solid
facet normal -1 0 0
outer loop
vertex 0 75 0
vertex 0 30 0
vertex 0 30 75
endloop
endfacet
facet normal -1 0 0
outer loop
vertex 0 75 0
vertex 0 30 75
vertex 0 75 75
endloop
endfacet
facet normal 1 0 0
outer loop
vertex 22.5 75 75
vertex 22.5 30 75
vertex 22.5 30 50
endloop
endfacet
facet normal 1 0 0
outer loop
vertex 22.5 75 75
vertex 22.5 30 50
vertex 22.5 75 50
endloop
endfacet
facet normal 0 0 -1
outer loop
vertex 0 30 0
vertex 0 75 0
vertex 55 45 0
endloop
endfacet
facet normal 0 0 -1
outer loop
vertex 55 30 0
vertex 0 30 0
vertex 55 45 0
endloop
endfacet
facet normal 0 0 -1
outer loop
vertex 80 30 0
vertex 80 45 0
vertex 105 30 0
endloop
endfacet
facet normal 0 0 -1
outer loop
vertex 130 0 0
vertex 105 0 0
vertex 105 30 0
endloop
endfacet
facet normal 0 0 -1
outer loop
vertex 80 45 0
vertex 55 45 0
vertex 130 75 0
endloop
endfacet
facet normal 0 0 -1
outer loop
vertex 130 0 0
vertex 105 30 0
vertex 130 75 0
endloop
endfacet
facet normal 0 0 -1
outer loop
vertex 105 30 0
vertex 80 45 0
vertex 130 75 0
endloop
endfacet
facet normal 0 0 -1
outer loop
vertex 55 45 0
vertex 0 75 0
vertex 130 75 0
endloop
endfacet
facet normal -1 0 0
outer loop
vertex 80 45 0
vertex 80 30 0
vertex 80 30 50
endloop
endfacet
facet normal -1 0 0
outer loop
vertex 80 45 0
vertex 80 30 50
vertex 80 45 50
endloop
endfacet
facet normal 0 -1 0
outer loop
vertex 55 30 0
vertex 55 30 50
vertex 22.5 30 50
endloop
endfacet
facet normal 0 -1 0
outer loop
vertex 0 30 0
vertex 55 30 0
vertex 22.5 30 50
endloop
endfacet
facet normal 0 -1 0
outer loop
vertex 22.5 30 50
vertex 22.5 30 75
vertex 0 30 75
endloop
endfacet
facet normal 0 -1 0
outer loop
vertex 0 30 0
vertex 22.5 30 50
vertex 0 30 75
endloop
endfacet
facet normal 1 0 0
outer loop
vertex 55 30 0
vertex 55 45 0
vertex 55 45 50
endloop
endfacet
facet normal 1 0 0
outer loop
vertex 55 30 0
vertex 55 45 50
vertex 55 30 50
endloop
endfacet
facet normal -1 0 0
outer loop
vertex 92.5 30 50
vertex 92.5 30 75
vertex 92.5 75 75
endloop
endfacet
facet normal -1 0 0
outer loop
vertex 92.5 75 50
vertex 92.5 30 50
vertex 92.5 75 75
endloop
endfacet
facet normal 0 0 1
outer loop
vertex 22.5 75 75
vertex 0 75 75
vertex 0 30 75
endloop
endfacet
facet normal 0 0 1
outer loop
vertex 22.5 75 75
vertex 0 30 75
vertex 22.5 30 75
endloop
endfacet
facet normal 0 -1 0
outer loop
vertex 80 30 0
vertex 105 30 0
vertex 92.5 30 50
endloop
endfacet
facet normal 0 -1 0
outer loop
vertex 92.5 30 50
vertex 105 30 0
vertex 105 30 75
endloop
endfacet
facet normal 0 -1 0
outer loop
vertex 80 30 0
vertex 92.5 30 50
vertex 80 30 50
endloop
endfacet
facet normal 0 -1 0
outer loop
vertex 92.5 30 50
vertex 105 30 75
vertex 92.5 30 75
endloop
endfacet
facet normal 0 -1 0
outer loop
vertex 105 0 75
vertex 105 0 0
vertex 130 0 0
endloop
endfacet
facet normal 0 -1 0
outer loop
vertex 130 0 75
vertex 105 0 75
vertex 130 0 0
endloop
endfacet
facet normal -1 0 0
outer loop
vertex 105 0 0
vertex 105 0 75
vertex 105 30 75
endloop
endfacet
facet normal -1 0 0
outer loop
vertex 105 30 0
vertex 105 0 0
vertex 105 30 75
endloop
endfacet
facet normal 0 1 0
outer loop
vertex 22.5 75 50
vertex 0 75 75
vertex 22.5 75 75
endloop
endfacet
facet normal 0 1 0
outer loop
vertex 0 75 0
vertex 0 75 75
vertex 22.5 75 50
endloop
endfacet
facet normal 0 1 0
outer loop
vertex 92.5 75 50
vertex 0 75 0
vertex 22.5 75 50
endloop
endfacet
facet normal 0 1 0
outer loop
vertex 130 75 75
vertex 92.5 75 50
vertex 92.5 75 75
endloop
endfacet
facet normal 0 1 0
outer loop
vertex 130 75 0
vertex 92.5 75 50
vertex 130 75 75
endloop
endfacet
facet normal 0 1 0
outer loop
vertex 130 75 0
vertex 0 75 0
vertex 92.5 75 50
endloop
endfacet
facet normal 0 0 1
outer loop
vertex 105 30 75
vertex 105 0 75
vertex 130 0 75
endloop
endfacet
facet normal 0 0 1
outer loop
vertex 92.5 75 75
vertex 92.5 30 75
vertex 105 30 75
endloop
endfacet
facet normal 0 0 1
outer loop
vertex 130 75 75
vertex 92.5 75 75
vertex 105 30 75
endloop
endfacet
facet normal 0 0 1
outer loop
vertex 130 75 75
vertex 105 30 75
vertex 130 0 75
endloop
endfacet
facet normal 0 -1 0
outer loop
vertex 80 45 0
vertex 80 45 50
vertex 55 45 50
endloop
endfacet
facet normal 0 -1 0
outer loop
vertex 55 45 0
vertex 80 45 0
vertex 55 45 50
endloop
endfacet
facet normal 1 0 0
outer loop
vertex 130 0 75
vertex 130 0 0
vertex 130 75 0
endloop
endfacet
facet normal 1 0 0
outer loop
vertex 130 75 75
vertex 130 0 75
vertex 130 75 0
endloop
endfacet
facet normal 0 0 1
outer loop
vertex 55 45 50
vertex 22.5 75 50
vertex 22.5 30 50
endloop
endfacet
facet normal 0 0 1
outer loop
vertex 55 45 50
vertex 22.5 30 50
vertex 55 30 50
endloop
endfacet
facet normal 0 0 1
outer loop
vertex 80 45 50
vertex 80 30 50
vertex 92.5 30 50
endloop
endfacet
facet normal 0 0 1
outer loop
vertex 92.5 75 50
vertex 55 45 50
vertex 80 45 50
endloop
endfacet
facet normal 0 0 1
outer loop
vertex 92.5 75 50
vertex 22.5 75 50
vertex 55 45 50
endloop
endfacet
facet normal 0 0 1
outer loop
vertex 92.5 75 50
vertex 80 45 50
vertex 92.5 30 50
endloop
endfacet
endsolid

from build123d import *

# Parameters (mm, degrees)
F0_W     = 130
F0_H     = 75
F1_DEPTH = 75
F3_DEPTH = 90
F4_W     = 70
F4_H     = 45
F5_DEPTH = 25


with BuildPart() as f1:
    # F0 (on Top) → F1 (new body)
    with BuildSketch(Plane.XY):
        with Locations((65, 37.5)):
            Rectangle(F0_W, F0_H)
    extrude(amount=F1_DEPTH)

    # F2 (on face) → F3 (cut)
    with BuildSketch(Plane.XY.offset(75)):
        Polygon((0, 0), (105, 0), (105, 30), (80, 30), (80, 45), (55, 45), (55, 30), (0, 30), align=None)
    extrude(amount=-F3_DEPTH, mode=Mode.SUBTRACT)

    # F4 (on face) → F5 (cut)
    with BuildSketch(Plane.XY.offset(75)):
        with Locations((57.5, 52.5)):
            Rectangle(F4_W, F4_H)
    extrude(amount=-F5_DEPTH, mode=Mode.SUBTRACT)


solid = f1.part
